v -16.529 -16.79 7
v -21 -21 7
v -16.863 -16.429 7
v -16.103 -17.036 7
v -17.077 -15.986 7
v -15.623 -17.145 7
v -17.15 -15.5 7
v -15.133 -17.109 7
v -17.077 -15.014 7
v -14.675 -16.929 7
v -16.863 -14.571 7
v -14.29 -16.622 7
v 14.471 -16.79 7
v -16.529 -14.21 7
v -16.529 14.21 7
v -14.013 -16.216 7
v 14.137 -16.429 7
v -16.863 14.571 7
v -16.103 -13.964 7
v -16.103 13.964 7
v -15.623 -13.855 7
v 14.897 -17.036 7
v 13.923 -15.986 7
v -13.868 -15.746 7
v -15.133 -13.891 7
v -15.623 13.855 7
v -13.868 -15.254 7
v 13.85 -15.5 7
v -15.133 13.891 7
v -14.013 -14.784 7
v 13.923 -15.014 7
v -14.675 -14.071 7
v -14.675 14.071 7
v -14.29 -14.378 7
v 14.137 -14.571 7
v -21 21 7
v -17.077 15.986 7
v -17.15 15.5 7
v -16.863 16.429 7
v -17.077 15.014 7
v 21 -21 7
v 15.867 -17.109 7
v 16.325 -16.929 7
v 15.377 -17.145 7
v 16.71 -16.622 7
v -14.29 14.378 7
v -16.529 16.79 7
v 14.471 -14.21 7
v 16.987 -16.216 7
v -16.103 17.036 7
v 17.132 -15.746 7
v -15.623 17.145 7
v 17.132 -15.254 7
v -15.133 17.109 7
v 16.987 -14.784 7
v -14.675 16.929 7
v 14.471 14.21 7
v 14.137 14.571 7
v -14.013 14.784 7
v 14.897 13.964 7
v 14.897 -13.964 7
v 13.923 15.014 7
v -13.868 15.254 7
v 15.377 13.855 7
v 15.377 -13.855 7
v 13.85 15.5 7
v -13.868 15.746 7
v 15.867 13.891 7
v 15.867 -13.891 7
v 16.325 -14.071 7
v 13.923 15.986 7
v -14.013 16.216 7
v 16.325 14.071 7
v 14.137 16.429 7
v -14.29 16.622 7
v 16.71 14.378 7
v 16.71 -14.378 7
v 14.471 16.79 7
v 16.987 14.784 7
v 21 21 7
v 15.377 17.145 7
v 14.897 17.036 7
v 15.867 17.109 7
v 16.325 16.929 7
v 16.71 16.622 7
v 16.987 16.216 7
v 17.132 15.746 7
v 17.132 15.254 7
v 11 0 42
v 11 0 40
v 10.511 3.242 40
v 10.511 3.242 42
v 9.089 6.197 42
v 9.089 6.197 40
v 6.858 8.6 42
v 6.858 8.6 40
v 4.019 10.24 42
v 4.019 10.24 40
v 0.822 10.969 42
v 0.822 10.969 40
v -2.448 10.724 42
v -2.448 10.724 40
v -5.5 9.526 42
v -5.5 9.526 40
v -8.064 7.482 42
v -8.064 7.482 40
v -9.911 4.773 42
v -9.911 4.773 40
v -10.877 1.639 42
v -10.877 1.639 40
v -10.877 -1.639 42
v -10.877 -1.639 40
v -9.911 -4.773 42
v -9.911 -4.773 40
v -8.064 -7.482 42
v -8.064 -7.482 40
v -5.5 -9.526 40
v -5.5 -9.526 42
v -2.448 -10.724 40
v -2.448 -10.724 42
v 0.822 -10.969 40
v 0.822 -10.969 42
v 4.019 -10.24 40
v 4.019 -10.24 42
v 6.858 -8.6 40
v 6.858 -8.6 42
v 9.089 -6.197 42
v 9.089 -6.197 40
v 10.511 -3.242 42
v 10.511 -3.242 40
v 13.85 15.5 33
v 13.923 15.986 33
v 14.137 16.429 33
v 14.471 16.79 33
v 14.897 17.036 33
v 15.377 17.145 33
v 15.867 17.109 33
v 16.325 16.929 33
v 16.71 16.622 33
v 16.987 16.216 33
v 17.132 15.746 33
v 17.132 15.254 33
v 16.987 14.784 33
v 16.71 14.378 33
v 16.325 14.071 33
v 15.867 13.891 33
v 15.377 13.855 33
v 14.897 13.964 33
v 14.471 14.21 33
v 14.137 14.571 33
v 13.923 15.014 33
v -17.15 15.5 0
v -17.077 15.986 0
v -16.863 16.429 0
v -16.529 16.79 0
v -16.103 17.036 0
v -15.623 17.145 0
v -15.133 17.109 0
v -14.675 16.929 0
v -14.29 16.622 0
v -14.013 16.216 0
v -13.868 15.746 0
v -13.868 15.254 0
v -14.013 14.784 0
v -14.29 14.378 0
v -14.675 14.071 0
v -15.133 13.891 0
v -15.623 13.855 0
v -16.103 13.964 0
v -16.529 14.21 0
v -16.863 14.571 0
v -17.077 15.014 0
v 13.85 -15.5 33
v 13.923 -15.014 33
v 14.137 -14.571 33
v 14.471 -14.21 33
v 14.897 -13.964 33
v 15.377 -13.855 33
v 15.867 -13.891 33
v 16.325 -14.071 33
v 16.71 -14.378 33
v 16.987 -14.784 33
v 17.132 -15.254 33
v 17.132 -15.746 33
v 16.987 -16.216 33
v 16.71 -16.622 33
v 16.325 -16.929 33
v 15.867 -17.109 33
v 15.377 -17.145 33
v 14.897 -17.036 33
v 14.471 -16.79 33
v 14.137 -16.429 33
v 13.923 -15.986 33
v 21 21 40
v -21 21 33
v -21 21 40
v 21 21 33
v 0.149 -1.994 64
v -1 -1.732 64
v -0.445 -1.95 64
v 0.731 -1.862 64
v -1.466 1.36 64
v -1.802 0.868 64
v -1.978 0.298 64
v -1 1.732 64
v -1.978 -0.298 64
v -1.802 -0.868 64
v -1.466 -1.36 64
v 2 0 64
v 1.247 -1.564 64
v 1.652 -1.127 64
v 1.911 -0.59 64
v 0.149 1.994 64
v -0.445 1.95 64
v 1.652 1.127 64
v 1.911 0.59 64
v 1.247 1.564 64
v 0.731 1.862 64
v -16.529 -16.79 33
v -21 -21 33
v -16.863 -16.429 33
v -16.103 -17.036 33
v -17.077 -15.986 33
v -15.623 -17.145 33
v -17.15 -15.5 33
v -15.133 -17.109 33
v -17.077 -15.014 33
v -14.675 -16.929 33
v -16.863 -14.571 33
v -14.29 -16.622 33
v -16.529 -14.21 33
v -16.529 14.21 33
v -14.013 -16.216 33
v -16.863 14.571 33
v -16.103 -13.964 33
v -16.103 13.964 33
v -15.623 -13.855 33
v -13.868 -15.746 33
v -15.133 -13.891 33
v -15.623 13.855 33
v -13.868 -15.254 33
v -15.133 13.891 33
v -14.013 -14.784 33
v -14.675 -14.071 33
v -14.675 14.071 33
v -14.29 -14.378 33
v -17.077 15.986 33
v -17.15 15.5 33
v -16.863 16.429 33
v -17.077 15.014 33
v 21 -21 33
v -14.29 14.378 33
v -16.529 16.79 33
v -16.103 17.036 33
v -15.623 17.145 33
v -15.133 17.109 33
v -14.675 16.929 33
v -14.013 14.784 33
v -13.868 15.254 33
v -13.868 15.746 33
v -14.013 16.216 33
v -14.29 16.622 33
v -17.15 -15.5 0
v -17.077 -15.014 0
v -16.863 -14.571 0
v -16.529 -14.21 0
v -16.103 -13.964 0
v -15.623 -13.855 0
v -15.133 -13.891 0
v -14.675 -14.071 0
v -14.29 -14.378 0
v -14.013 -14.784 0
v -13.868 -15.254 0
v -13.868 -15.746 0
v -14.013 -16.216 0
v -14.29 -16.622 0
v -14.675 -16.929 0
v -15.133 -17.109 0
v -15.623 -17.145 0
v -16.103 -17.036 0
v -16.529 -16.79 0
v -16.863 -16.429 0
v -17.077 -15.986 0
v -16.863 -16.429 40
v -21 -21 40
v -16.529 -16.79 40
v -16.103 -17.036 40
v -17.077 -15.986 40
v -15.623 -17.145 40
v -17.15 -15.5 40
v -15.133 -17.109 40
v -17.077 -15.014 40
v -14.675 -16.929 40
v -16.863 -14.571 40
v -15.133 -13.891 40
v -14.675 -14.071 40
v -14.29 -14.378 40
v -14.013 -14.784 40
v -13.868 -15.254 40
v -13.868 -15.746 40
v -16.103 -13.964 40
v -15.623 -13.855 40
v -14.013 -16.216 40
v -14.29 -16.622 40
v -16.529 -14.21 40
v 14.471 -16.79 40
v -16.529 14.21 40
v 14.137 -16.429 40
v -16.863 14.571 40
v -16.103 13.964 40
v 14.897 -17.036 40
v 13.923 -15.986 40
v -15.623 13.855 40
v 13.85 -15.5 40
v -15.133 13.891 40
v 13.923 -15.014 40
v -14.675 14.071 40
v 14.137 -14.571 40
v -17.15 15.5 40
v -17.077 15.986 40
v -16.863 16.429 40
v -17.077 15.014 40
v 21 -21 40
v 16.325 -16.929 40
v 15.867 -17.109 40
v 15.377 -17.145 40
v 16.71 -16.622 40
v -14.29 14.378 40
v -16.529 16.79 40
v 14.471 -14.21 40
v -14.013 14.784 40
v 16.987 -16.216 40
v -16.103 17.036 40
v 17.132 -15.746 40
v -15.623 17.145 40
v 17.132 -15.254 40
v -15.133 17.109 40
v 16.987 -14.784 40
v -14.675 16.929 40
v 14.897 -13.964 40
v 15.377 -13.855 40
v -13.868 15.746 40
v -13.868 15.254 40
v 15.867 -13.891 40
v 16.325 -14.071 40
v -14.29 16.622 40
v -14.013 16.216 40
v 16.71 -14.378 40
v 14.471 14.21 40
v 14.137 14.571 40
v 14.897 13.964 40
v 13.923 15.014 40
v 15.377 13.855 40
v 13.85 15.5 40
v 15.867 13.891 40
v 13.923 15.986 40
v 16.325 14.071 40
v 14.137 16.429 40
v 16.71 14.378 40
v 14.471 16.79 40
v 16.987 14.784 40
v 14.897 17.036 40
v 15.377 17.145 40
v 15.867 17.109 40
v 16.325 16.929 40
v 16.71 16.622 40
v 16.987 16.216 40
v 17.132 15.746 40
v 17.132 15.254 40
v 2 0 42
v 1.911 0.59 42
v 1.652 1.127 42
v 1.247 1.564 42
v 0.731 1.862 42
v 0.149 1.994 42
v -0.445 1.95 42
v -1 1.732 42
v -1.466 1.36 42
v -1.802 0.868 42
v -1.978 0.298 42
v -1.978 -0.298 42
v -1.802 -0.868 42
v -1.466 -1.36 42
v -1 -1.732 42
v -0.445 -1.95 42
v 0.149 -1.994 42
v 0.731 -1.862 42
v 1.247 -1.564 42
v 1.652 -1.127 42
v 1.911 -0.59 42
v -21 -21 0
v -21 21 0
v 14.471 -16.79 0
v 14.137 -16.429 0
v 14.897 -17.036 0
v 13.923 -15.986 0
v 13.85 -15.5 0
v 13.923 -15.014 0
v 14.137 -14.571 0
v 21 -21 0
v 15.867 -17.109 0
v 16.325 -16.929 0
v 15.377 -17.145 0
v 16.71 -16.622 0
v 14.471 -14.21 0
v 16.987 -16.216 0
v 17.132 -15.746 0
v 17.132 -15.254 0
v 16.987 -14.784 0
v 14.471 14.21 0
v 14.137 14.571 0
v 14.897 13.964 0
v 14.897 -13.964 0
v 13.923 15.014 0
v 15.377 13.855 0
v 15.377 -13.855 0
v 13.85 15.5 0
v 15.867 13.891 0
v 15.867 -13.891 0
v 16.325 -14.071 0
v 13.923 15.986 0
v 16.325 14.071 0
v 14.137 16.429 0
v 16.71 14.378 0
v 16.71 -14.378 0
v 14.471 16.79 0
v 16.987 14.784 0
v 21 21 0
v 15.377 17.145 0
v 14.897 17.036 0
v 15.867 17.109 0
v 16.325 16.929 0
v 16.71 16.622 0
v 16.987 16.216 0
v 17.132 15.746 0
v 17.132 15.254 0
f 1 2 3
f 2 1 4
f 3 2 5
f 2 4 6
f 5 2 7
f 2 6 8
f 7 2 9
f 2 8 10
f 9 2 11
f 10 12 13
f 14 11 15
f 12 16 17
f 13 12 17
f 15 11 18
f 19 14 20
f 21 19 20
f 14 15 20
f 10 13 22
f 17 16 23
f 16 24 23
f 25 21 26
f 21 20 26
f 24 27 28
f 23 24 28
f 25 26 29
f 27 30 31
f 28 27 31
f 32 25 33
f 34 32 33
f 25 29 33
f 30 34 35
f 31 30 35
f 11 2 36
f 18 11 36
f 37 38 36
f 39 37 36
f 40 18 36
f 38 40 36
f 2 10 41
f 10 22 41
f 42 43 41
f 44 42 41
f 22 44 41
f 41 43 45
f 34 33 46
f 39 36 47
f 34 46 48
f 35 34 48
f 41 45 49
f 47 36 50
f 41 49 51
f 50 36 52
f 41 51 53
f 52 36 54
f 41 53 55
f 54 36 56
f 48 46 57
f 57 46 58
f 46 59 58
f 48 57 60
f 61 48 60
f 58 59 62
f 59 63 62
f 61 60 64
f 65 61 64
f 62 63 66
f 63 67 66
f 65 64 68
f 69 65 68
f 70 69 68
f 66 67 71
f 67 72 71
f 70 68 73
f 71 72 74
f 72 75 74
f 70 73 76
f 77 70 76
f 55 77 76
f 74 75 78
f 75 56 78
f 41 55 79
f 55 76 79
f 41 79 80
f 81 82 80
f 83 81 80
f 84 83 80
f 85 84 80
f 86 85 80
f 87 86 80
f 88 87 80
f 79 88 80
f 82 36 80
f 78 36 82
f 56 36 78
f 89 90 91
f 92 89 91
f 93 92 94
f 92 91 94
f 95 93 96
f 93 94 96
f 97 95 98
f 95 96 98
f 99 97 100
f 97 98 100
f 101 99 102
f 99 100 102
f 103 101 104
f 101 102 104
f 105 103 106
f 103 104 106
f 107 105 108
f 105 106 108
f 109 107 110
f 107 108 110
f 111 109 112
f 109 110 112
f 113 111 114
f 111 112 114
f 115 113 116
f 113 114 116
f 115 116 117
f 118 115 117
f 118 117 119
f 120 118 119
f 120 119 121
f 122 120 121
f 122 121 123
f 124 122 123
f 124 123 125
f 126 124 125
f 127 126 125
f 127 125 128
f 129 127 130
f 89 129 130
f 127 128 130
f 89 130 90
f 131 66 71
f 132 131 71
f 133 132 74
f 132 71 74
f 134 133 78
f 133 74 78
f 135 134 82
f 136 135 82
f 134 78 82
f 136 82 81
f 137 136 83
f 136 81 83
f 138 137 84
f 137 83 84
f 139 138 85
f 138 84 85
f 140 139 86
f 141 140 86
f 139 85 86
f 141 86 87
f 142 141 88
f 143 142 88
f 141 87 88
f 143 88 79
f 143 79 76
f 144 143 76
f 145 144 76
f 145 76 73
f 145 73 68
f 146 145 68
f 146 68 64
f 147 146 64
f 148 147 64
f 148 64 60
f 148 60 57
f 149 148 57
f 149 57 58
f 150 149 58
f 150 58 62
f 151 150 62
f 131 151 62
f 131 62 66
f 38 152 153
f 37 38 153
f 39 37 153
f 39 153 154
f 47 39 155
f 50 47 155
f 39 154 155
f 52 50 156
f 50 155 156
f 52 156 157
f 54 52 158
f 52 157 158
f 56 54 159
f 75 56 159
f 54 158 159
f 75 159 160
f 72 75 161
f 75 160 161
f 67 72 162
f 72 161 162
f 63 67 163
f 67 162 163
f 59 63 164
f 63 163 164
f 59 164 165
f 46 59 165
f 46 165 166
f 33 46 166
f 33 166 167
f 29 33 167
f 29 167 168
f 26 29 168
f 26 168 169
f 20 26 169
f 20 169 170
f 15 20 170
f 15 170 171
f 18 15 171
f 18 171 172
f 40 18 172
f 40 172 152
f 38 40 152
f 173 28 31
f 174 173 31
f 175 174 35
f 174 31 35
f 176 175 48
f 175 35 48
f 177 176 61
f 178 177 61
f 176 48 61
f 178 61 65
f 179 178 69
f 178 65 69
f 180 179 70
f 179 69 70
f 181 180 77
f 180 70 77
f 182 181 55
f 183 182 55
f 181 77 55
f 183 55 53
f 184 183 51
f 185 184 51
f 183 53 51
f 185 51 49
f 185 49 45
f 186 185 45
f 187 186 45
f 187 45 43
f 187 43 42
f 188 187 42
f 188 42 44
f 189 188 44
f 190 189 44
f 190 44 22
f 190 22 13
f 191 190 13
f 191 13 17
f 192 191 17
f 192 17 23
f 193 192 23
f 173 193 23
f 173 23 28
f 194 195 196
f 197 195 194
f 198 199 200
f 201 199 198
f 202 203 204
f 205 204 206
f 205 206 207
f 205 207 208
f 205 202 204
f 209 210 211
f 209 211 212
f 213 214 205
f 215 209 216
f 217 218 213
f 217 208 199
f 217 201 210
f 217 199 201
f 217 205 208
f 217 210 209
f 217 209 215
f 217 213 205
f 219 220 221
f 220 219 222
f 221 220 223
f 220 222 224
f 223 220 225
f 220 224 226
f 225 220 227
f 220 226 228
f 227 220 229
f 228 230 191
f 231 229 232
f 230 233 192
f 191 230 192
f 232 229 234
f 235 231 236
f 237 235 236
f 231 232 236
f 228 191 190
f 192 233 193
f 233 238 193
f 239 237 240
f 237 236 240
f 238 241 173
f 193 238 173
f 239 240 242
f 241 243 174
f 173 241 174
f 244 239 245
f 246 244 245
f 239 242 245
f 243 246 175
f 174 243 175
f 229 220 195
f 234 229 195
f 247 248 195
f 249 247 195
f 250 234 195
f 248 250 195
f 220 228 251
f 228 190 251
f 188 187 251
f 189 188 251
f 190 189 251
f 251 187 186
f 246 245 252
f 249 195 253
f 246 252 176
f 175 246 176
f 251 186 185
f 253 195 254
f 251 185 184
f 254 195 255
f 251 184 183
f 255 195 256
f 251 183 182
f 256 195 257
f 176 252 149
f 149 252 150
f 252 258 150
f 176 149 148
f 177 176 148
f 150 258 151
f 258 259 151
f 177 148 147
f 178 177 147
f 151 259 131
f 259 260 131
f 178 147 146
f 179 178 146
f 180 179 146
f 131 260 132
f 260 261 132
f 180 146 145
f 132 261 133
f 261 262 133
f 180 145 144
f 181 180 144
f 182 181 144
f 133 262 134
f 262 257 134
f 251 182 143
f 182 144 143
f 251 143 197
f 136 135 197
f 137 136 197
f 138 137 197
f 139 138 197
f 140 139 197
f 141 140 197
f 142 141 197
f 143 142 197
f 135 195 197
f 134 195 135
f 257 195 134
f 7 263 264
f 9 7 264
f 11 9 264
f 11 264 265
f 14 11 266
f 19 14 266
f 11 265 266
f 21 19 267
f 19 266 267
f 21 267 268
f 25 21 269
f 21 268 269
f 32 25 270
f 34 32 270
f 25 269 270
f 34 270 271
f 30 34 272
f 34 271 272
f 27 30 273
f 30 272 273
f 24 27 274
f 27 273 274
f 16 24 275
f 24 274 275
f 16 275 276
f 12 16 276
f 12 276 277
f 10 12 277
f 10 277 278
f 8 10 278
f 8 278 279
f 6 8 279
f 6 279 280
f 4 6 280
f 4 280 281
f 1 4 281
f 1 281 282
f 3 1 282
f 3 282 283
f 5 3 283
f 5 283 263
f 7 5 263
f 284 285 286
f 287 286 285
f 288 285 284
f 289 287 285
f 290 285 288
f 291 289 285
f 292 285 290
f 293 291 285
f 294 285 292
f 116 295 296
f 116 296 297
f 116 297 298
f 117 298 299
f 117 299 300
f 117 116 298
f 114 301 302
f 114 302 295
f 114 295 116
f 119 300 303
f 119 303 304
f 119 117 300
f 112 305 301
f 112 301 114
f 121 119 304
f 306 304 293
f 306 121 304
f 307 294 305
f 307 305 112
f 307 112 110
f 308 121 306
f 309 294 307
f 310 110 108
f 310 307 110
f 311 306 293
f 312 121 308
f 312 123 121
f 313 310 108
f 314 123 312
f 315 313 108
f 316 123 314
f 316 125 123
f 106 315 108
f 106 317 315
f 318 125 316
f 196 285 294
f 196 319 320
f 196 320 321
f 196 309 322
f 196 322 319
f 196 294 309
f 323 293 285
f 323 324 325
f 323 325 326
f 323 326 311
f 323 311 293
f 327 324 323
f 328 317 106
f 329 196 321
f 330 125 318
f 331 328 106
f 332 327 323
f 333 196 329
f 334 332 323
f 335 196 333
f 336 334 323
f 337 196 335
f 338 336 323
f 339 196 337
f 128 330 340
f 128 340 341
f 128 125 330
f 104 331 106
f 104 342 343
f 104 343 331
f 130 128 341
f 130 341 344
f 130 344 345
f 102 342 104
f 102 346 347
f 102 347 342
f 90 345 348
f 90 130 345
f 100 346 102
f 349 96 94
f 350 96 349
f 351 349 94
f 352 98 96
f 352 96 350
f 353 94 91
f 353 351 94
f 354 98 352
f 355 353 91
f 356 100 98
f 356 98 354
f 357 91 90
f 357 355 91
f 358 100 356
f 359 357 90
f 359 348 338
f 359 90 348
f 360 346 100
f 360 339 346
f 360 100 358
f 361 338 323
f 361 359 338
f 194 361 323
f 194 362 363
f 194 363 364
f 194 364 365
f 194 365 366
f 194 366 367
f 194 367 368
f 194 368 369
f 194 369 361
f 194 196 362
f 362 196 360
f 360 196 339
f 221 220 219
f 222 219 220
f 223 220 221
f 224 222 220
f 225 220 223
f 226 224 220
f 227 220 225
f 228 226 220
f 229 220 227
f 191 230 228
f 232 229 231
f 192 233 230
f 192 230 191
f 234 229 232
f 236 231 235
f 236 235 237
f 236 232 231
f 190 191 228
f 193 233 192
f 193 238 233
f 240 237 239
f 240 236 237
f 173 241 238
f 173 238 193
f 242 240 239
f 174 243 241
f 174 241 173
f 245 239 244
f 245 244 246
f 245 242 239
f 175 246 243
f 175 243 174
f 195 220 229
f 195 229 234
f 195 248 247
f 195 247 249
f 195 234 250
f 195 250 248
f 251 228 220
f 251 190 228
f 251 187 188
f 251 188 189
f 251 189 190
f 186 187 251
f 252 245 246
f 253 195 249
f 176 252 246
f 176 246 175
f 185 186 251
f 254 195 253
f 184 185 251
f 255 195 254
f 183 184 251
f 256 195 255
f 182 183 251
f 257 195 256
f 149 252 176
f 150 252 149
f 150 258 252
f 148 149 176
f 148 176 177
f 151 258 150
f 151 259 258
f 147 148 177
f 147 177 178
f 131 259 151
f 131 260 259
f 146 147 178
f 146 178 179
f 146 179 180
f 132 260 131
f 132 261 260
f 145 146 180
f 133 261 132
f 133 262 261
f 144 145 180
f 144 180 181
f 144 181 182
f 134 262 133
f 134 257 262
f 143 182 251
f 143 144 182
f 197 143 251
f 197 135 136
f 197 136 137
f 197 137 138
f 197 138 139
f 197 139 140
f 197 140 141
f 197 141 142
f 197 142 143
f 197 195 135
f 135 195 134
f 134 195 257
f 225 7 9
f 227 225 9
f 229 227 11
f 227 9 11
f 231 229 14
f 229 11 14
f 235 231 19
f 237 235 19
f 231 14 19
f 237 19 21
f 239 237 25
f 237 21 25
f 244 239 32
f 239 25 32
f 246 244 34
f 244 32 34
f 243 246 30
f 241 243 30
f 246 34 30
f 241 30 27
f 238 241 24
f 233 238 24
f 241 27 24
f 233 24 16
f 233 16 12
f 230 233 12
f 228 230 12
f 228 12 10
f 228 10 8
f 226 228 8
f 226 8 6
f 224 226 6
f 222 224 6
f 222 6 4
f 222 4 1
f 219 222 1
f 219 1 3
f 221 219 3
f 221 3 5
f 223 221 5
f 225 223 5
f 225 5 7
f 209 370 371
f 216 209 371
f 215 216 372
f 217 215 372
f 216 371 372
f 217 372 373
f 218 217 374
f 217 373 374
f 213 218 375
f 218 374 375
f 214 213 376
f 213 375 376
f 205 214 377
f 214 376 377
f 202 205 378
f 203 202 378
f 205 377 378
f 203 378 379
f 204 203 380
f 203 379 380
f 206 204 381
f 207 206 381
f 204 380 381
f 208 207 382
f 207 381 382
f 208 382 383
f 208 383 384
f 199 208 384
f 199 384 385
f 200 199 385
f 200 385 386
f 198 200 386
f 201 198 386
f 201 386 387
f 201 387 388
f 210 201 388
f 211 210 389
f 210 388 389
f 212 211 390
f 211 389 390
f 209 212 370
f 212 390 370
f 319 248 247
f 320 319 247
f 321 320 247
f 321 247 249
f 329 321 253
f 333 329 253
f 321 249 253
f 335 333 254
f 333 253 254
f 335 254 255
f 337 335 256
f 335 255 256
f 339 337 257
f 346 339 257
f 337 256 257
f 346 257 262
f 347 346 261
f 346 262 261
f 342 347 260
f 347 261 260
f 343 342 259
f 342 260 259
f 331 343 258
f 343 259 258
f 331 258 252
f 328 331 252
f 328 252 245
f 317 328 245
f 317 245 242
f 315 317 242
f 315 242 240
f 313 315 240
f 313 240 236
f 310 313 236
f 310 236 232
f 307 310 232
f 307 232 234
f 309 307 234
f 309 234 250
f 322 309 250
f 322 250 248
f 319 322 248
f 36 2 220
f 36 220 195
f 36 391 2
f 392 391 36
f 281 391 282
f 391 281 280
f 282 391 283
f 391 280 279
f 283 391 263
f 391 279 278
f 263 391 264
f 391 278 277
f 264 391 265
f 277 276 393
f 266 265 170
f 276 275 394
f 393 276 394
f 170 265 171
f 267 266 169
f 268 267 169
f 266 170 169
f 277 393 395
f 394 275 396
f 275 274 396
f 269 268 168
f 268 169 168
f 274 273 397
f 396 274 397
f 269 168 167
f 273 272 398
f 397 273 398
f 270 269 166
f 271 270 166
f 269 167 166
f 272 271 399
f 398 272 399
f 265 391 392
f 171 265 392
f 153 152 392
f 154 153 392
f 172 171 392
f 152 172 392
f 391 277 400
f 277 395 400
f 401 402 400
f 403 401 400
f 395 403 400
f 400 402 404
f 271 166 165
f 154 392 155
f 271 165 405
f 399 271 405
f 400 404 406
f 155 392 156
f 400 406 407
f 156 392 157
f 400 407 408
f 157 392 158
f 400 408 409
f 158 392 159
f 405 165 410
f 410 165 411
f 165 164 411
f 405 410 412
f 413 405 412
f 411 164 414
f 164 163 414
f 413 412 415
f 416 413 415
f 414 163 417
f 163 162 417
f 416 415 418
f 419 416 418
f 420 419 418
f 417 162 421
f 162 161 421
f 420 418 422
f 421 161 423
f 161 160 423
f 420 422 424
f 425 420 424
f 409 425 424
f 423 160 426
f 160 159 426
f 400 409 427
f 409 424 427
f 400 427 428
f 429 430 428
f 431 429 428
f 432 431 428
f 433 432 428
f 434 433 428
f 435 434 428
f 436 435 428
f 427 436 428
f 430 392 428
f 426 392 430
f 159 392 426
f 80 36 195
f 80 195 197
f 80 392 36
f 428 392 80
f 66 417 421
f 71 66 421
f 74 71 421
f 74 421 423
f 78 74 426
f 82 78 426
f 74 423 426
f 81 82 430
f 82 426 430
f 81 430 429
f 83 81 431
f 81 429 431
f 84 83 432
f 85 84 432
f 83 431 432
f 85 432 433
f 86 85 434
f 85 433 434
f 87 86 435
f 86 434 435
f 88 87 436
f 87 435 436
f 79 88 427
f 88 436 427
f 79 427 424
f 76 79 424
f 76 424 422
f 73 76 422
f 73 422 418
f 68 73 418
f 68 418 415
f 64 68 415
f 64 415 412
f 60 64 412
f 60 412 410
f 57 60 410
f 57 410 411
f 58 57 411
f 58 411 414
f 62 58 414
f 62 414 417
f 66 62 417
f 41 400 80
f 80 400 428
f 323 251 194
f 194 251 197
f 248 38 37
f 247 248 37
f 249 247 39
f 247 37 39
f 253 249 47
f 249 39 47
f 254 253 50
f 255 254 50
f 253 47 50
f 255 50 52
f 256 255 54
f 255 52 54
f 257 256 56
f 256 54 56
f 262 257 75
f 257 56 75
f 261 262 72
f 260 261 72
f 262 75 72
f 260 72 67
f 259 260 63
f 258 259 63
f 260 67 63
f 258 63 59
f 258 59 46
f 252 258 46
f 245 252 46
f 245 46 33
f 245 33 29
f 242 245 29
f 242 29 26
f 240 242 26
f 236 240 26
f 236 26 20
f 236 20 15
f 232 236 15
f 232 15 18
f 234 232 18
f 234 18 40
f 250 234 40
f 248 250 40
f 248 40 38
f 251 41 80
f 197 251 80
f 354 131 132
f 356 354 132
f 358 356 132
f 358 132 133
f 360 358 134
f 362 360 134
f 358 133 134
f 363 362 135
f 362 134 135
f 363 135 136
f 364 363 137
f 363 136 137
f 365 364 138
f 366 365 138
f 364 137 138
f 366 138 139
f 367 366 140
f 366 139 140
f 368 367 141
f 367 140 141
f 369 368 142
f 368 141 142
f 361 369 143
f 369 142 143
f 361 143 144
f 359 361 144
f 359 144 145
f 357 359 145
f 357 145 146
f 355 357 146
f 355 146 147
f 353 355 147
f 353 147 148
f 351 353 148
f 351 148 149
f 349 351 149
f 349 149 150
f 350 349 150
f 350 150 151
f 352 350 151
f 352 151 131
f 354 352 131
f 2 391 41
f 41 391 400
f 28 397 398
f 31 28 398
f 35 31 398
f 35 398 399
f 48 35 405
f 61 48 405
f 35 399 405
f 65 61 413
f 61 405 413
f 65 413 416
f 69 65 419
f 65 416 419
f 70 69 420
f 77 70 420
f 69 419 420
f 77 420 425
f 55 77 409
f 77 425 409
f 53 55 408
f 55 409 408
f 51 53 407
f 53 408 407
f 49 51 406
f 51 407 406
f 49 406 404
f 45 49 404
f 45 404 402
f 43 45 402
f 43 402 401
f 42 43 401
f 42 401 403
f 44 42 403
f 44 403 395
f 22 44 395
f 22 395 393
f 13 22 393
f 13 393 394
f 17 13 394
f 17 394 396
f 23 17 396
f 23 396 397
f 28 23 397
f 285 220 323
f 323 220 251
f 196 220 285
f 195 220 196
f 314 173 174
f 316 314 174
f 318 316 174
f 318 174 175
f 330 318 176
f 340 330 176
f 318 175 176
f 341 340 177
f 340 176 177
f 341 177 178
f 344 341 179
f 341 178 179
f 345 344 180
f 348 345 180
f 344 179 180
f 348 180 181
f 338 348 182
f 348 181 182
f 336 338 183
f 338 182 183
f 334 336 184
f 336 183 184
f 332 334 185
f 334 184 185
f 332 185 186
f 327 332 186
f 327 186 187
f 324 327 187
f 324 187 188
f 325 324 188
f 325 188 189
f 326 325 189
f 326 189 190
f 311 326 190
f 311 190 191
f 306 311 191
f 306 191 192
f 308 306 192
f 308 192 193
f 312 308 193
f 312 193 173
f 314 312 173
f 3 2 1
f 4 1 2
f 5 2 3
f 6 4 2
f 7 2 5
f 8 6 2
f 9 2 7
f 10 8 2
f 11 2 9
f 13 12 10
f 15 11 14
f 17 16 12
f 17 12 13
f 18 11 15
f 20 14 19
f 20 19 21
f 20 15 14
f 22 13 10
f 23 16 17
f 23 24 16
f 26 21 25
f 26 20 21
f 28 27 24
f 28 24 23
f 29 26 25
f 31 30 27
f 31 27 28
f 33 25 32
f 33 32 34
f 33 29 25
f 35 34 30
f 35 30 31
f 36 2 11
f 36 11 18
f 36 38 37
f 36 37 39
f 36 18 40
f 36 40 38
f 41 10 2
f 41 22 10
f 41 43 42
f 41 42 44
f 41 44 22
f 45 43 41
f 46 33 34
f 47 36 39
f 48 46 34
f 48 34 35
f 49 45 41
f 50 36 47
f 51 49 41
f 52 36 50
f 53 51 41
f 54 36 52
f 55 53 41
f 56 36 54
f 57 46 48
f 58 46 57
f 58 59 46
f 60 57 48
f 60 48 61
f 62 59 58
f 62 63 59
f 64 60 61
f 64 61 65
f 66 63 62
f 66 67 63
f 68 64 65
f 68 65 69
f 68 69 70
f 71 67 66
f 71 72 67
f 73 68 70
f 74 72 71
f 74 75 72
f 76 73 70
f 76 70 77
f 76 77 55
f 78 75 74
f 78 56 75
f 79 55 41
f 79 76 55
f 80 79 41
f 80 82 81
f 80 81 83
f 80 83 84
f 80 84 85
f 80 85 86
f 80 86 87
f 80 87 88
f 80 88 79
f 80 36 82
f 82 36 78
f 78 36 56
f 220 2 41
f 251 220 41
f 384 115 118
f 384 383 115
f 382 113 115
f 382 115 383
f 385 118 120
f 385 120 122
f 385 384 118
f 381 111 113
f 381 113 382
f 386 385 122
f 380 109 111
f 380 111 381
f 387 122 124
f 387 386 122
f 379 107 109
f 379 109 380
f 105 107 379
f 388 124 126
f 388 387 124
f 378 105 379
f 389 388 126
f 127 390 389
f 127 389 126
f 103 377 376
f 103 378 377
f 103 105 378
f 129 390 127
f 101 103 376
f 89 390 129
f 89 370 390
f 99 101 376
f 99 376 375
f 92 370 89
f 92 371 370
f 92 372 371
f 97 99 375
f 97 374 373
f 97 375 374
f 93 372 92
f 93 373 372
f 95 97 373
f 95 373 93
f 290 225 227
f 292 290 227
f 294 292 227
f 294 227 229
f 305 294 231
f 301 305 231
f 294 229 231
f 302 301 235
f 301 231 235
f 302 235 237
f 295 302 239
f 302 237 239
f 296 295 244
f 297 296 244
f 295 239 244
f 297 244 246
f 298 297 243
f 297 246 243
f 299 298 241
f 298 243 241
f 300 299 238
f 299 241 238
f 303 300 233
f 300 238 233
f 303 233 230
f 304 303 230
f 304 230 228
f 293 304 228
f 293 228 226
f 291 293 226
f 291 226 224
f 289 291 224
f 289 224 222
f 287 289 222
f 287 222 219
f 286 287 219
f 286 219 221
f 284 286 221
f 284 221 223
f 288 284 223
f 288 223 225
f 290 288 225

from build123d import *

# Parameters (mm, degrees)
F0_W     = 42
F0_H     = 42
F1_DEPTH = 7
F2_DEPTH = 26
F3_DEPTH = 7
F5_D     = 3.3
F5_2_D   = 3.3
F5_3_D   = 3.3
F6_R     = 11
F7_DEPTH = 2
F8_R     = 2
F9_DEPTH = 22


with BuildPart() as f1:
    # F0 (on Top) → F1 (new body)
    with BuildSketch(Plane.XY):
        Rectangle(F0_W, F0_H)
    extrude(amount=F1_DEPTH)


with BuildPart() as f2:
    # F2 (new): a face of the model
    f2_faces = [f1.part.faces().sort_by_distance(p)[0] for p in [
        (0, 0, 7),
    ]]
    extrude(f2_faces, amount=F2_DEPTH)


with BuildPart() as f3:
    # F3 (new): a face of the model
    f3_faces = [f2.part.faces().sort_by_distance(p)[0] for p in [
        (0, 0, 33),
    ]]
    extrude(f3_faces, amount=F3_DEPTH)

    # F5#3 (through all)
    with Locations(Plane.XY.offset(40)):
        with Locations((-15.5, 15.5), (15.5, 15.5), (-15.5, -15.5), (15.5, -15.5)):
            Hole(F5_3_D / 2)

    # F6 (on face) → F7 (join)
    with BuildSketch(Plane.XY.offset(40)):
        Circle(F6_R)
    extrude(amount=F7_DEPTH)

    # F8 (on face) → F9 (join)
    with BuildSketch(Plane.XY.offset(42)):
        Circle(F8_R)
    extrude(amount=F9_DEPTH)


with BuildPart() as f1_1:
    add(f1.part)

    # F5 (through all)
    with Locations(Plane.XY.offset(40)):
        with Locations((-15.5, 15.5), (15.5, 15.5), (-15.5, -15.5), (15.5, -15.5)):
            Hole(F5_D / 2)


with BuildPart() as f2_1:
    add(f2.part)

    # F5#2 (through all)
    with Locations(Plane.XY.offset(40)):
        with Locations((-15.5, 15.5), (15.5, 15.5), (-15.5, -15.5), (15.5, -15.5)):
            Hole(F5_2_D / 2)


solid = Compound([f3.part, f1_1.part, f2_1.part])
